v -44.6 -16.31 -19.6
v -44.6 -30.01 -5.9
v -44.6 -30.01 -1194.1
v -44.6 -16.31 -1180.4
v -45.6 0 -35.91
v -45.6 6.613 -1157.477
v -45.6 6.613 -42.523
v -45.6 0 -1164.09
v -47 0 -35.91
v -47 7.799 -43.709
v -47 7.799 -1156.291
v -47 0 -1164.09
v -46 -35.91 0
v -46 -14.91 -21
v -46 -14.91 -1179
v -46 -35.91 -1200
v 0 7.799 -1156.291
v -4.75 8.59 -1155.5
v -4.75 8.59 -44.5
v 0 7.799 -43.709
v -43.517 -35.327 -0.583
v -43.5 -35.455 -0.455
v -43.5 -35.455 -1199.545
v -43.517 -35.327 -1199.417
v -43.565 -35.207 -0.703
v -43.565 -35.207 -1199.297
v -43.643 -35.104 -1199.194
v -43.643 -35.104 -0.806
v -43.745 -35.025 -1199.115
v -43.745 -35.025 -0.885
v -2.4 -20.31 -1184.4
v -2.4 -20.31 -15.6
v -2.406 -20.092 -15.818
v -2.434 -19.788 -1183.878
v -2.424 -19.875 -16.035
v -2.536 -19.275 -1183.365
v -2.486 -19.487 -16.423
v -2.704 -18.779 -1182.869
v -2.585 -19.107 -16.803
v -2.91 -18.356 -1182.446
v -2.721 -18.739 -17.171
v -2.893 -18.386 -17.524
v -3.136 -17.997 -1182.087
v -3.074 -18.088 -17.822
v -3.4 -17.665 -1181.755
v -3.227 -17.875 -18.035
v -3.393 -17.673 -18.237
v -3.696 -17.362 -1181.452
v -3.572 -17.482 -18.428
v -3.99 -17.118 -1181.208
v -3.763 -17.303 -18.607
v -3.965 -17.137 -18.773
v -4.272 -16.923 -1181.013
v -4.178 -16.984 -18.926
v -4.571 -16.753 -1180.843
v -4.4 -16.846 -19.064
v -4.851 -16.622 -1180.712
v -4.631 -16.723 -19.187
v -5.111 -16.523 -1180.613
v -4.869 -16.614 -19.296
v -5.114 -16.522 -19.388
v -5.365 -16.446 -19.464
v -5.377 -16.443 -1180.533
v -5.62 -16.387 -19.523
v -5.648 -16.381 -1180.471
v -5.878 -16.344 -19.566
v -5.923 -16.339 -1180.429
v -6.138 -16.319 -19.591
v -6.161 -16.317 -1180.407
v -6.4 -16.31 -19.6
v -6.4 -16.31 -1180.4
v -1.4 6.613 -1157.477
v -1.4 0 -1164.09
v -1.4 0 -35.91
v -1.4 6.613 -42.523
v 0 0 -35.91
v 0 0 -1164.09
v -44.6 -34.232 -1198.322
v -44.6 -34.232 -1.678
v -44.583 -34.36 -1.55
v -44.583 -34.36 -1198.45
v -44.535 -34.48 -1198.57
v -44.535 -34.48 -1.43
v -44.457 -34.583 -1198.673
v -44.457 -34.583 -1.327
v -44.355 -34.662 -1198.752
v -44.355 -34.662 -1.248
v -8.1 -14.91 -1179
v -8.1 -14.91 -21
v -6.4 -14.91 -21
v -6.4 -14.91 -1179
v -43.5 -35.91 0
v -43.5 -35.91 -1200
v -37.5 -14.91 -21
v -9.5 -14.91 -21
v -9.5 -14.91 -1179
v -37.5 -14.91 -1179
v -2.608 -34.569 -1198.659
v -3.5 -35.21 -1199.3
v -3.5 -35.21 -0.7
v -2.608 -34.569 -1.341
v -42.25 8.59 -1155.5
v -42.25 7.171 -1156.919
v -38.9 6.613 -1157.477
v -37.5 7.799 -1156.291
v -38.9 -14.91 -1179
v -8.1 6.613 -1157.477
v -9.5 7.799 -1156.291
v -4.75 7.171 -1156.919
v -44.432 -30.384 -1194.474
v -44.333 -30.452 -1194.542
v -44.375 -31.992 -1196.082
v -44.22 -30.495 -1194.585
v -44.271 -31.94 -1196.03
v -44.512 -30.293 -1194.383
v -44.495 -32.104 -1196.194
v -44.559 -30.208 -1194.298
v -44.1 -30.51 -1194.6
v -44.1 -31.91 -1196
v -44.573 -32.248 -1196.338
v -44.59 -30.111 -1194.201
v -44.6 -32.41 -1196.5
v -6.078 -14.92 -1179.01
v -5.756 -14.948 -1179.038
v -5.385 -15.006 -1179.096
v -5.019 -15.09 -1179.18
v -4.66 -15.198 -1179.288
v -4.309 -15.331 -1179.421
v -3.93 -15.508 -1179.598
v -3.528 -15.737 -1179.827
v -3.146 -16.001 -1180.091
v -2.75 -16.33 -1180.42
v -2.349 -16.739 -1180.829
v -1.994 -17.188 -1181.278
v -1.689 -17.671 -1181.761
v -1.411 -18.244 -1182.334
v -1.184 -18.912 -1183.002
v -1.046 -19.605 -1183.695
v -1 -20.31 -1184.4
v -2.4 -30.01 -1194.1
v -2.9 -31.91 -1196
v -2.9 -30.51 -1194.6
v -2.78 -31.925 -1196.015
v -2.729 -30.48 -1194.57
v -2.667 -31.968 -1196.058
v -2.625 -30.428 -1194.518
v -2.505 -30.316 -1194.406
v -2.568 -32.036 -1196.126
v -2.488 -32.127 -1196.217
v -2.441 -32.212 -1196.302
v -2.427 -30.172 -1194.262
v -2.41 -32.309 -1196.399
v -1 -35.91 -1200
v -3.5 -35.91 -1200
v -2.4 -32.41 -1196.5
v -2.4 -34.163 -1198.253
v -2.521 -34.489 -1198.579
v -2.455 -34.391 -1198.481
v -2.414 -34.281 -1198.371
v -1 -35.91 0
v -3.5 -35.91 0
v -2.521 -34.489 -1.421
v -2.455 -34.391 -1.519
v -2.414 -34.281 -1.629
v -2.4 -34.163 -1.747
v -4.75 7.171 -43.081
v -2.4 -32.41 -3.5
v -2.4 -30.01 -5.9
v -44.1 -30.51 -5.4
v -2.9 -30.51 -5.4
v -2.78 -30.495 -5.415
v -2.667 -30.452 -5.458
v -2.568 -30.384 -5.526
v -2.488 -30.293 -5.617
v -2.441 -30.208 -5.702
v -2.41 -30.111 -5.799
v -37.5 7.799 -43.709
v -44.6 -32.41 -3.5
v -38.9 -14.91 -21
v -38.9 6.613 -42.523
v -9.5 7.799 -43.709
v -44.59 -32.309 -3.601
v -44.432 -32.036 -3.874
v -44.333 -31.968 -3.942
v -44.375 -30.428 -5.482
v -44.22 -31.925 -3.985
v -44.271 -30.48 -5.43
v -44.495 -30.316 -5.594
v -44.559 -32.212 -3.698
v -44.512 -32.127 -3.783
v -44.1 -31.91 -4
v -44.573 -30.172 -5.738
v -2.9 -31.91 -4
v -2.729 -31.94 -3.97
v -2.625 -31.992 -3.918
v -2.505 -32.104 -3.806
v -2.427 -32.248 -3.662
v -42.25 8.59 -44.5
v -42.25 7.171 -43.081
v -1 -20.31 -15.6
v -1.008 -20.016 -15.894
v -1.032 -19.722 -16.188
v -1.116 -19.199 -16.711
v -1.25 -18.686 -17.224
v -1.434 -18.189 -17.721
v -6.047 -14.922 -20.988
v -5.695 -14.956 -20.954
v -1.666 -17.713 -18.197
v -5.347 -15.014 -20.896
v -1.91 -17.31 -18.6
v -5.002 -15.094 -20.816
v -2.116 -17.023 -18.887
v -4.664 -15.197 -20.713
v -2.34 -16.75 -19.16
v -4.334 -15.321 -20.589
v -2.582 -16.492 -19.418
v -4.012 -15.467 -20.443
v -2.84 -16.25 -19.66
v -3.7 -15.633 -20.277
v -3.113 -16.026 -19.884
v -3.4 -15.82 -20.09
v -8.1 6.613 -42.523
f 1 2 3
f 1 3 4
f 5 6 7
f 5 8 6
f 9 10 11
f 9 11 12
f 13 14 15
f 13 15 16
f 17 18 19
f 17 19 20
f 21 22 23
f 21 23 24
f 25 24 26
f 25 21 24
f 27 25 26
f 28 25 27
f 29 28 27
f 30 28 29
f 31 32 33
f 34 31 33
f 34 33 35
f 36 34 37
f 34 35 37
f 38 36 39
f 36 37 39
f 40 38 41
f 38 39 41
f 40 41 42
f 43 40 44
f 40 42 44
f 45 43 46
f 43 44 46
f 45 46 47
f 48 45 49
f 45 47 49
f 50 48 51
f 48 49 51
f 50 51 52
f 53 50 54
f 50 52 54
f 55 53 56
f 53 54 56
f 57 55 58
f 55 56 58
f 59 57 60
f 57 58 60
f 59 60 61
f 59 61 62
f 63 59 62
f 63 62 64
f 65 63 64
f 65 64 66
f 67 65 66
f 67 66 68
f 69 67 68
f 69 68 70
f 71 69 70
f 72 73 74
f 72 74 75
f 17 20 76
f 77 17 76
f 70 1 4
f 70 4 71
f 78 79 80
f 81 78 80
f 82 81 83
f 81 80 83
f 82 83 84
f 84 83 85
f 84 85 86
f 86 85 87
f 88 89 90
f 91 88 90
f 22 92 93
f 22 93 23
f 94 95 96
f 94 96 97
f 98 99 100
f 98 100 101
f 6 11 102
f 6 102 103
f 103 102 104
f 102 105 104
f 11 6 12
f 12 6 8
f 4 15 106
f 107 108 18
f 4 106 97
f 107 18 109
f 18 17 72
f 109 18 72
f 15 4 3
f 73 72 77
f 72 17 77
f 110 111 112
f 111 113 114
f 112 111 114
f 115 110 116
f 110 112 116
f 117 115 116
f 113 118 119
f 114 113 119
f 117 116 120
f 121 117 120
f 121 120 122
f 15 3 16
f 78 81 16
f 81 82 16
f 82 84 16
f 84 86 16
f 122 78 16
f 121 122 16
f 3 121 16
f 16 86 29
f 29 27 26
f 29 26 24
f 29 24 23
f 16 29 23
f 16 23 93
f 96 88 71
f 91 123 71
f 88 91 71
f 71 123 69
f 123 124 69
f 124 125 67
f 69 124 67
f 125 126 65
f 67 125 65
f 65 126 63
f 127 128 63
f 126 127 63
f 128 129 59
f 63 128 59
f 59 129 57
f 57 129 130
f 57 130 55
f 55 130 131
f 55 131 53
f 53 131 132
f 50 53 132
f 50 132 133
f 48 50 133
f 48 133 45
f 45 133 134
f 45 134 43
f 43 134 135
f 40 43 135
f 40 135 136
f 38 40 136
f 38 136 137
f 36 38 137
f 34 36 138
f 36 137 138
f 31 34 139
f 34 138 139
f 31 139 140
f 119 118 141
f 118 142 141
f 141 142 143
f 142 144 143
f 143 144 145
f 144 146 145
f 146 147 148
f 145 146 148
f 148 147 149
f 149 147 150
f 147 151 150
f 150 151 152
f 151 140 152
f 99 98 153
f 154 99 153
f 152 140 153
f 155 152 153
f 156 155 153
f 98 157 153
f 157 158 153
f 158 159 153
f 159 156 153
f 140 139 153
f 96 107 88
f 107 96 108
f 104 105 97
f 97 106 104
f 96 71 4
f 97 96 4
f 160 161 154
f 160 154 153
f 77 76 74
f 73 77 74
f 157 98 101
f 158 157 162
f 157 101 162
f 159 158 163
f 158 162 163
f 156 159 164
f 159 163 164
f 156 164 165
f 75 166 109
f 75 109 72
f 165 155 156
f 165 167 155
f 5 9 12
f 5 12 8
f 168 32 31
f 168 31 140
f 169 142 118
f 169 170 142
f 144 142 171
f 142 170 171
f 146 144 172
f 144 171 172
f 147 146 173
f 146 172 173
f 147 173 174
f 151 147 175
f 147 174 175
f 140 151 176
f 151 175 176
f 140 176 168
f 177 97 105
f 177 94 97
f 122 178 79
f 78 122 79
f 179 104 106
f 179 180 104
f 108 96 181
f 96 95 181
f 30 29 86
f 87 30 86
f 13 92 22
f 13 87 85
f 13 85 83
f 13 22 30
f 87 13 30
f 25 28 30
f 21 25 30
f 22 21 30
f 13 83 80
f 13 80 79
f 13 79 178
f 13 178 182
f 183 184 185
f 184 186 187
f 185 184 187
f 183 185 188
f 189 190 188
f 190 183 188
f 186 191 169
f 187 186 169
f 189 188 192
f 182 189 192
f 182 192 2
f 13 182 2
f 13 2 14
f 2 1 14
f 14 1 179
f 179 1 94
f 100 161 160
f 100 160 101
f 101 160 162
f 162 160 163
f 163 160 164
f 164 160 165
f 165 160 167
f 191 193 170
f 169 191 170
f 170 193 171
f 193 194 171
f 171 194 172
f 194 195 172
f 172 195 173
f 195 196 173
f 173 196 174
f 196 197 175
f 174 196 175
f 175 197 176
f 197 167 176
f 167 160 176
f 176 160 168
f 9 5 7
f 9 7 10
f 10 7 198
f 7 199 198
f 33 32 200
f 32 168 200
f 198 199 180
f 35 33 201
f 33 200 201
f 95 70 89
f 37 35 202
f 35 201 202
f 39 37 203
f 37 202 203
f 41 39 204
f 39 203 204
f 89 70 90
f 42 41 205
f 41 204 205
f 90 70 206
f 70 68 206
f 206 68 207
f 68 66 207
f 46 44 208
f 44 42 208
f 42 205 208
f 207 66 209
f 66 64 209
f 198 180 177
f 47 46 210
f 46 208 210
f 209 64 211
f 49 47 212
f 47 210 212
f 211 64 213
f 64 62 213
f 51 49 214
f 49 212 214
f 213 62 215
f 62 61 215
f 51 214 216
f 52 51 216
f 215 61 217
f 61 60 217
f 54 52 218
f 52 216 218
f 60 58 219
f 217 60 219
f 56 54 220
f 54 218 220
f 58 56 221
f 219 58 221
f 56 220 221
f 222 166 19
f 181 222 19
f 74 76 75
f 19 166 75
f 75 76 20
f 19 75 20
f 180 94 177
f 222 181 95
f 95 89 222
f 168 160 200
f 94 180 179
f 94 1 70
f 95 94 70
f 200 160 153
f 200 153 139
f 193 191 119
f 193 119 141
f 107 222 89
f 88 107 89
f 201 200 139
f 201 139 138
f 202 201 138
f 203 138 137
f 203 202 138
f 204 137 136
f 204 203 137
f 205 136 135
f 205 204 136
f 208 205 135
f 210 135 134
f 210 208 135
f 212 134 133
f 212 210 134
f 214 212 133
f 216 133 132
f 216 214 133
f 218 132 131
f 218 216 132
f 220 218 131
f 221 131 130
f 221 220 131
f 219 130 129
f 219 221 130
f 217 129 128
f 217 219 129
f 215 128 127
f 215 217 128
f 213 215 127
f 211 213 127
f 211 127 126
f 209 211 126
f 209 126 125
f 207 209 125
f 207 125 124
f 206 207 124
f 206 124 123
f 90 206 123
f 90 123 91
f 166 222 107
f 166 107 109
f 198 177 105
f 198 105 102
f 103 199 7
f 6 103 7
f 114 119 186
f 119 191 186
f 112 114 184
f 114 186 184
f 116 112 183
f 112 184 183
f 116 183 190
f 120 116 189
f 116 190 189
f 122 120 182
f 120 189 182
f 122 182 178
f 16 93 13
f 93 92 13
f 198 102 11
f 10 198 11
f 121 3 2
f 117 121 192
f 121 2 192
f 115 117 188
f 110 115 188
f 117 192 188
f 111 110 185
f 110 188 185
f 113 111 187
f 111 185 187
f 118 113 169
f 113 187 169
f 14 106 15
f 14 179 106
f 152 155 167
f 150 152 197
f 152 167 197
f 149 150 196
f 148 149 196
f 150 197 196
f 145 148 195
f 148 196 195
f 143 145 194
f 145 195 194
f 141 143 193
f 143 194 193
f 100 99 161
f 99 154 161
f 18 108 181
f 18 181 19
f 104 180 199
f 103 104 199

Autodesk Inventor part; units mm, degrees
ref_plane "YZ Plane" through (0, 0, 0) normal (1, 0, 0) x (0, 1, 0)
ref_plane "XZ Plane" through (0, 0, 0) normal (0, 1, 0) x (-1, 0, 0)
ref_plane "XY Plane" through (0, 0, 0) normal (0, 0, 1) x (1, 0, 0)
sketch "Boceto1" plane through (0, 0, 0) normal (0, 0, 1) x (1, 0, 0)
  line L0 (-46, -14.91) -> (-46, -35.91)
  line L1 (-44.1, -31.91) -> (-2.9, -31.91)
  line L2 (-1, -35.91) -> (-1, -20.31)
  line L3 (-8.1, 6.6131) -> (-8.1, -14.91)
  line L4 (-44.6, -16.31) -> (-6.4, -16.31)
  line L5 (-2.4, -20.31) -> (-2.4, -30.01)
  line L6 (-2.9, -30.51) -> (-44.1, -30.51)
  line L7 (-44.6, -30.01) -> (-44.6, -16.31)
  arc A0 (-2.4, -20.31) -> (-6.4, -16.31) centre (-6.4, -20.31) ccw
  line L8 (-2.4, -32.41) -> (-2.4, -34.1632)
  line L9 (-3.5, -35.91) -> (-1, -35.91)
  line L10 (-9.5, -14.91) -> (-9.5, 7.7994)
  line L11 (-44.6, -32.41) -> (-44.6, -34.2323)
  line L12 (-43.5, -35.91) -> (-46, -35.91)
  line L13 (-43.5, -35.91) -> (-43.5, -35.4546)
  line L14 (-3.5, -35.91) -> (-3.5, -35.21)
  line L15 (-43.7447, -35.0247) -> (-44.3553, -34.6622)
  line L16 (-3.5, -35.21) -> (-2.6082, -34.5692)
  arc A1 (-2.9, -30.51) -> (-2.4, -30.01) centre (-2.9, -30.01) ccw
  arc A2 (-2.4, -32.41) -> (-2.9, -31.91) centre (-2.9, -32.41) ccw
  arc A3 (-2.6082, -34.5692) -> (-2.4, -34.1632) centre (-2.9, -34.1632) ccw
  arc A4 (-44.6, -30.01) -> (-44.1, -30.51) centre (-44.1, -30.01) ccw
  arc A5 (-44.1, -31.91) -> (-44.6, -32.41) centre (-44.1, -32.41) ccw
  arc A6 (-44.6, -34.2323) -> (-44.3553, -34.6622) centre (-44.1, -34.2323) ccw
  arc A7 (-43.5, -35.4546) -> (-43.7447, -35.0247) centre (-44, -35.4546) ccw
  line L17 (-9.5, 7.7994) -> (-4.75, 8.59)
  line L18 (-4.75, 8.59) -> (0, 7.7994)
  line L19 (-8.1, 6.6131) -> (-4.75, 7.1707)
  line L20 (-4.75, 7.1707) -> (-1.4, 6.6131)
  line L21 (0, 7.7994) -> (0, 0)
  line L22 (0, 0) -> (-1.4, 0)
  line L23 (-1.4, 0) -> (-1.4, 6.6131)
  line L24 (-8.1, -14.91) -> (-6.4, -14.91)
  arc A8 (-1, -20.31) -> (-6.4, -14.91) centre (-6.4, -20.31) ccw
  line L25 (-4.75, 16.5254) -> (-4.75, 0) construction
  line L26 (-38.9, 6.6131) -> (-38.9, -14.91)
  line L27 (-37.5, -14.91) -> (-37.5, 7.7994)
  line L28 (-37.5, 7.7994) -> (-42.25, 8.59)
  line L29 (-42.25, 8.59) -> (-47, 7.7994)
  line L30 (-38.9, 6.6131) -> (-42.25, 7.1707)
  line L31 (-42.25, 7.1707) -> (-45.6, 6.6131)
  line L32 (-47, 7.7994) -> (-47, 0)
  line L33 (-47, 0) -> (-45.6, 0)
  line L34 (-45.6, 0) -> (-45.6, 6.6131)
  line L35 (-42.25, 16.5254) -> (-42.25, 0) construction
  line L36 (-9.5, -14.91) -> (-37.5, -14.91)
  line L37 (-38.9, -14.91) -> (-46, -14.91)
  line L38 (-23.5, 14.1873) -> (-23.5, -36.7854) construction
  point P0 (-44.6, -34.5169)
  point P1 (-43.5, -35.17)
  dimension "d17" = 4
  dimension "d24" = 1.4
  dimension "d50" = 0.7
  dimension "d61" = 0.74
  dimension "d62" = 30.7
  dimension "d63" = 35.7
  dimension "d206" = 1.4
  dimension "d207" = 1.4
  dimension "d210" = 1.4
  dimension "d211" = 1.4
  dimension "d213" = 14.2
  dimension "d214" = 1.4
  dimension "d215" = 1.4
  dimension "d216" = 1.4
  dimension "d217" = 1.4
  dimension "d218" = 45
  dimension "d223" = 5.4
  dimension "d224" = 1.4
  dimension "d225" = 9.5
  dimension "d226" = 4.75
  dimension "d227" = 3.35
  dimension "d228" = 6.7
  dimension "d229" = 44.5
  dimension "d230" = 3.35
  dimension "d231" = 2.5
  dimension "d232" = 2.5
  dimension "d240" = 8.59
  dimension "d241" = 3.35
  dimension "d242" = 99.45
  dimension "d243" = 161.1
  dimension "d246" = 1.4
  dimension "d247" = 1.4
  dimension "d248" = 1.4
  dimension "d253" = 1.4
  dimension "d254" = 1.4
  dimension "d255" = 1.4
  dimension "d256" = 1.4
  dimension "d257" = 8.59
  dimension "d258" = 161.1
  dimension "d259" = 99.45
  dimension "d260" = 22.5
  dimension "d266" = 23.5
  dimension "d267" = 47
  dimension "d268" = 3.35
  dimension "d269" = 9.5
  dimension "d270" = 4.75
  dimension "d271" = 3.35
  dimension "d272" = 6.7
  dimension "d273" = 28
  dimension "d274" = 37.5
  dimension "d275" = 8.5
  dimension "d276" = 8.5
  dimension "d277" = 44.5
  dimension "d278" = 0.5
  dimension "d279" = 14.91
  dimension "d280" = 14.91
  dimension "d283" = 16.5254
  dimension "d284" = 0
  dimension "d285" = 14.1873
  dimension "d286" = 36.7854
  dimension "d287" = 16.5254
  dimension "d288" = 0
extrude "Extrusión1" add sketch "Boceto1" against normal blind 1200
ref_plane "Plano de trabajo2" through (0, 0, -600) normal (0, 0, -1) x (-1, 0, 0)
sketch "Boceto2" plane through (0, 0, 0) normal (1, 0, 0) x (0, 1, 0)
  line L0 (-35.91, 0) -> (-20.31, 0) projected
  line L1 (-35.91, 0) -> (-35.91, -1200) projected
  line L2 (-20.31, -1200) -> (-35.91, -1200) projected
  line L3 (-20.31, 0) -> (-20.31, -1200) projected
  line L4 (-20.31, 0) -> (-14.91, 0) projected
  line L5 (-20.31, 0) -> (-20.31, -1200) projected
  line L6 (-14.91, -1200) -> (-20.31, -1200) projected
  line L7 (-14.91, 0) -> (-14.91, -1200) projected
  line L8 (-14.91, 0) -> (6.6131, 0) projected
  line L9 (-14.91, 0) -> (-14.91, -1200) projected
  line L10 (6.6131, -1200) -> (-14.91, -1200) projected
  line L11 (6.6131, 0) -> (6.6131, -1200) projected
  line L12 (0, 0) -> (7.7994, 0) projected
  line L13 (0, 0) -> (0, -1200) projected
  line L14 (7.7994, -1200) -> (0, -1200) projected
  line L15 (7.7994, 0) -> (7.7994, -1200) projected
  line L16 (7.7994, 0) -> (8.59, 0) projected
  line L17 (7.7994, 0) -> (7.7994, -1200) projected
  line L18 (8.59, -1200) -> (7.7994, -1200) projected
  line L19 (8.59, 0) -> (8.59, -1200) projected
  line L20 (-35.91, 0) -> (8.59, -44.5)
  line L21 (8.59, 0) -> (8.59, -44.5)
  line L22 (8.59, 0) -> (-35.91, 0)
  dimension "d291" = 45
extrude "Extrusión2" cut sketch "Boceto2" against normal through all contours L0 L3 L20 | L4 L7 L20 L3 | L8 L13 L20 L7 | L8 L11 L20 L13 | L12 L15 L20 L11 | L16 L19 L20 L15
mirror "Simetría2" about plane through (0, 0, -600) normal (0, 0, -1) of "Extrusión2"
ref_plane "Plano de trabajo4" through (0, 7.7994, 0) normal (0, 1, 0) x (0, 0, -1)
properties part number "SP40-09 MARCO CORREDERA 1200 MM" material "Aluminio"
